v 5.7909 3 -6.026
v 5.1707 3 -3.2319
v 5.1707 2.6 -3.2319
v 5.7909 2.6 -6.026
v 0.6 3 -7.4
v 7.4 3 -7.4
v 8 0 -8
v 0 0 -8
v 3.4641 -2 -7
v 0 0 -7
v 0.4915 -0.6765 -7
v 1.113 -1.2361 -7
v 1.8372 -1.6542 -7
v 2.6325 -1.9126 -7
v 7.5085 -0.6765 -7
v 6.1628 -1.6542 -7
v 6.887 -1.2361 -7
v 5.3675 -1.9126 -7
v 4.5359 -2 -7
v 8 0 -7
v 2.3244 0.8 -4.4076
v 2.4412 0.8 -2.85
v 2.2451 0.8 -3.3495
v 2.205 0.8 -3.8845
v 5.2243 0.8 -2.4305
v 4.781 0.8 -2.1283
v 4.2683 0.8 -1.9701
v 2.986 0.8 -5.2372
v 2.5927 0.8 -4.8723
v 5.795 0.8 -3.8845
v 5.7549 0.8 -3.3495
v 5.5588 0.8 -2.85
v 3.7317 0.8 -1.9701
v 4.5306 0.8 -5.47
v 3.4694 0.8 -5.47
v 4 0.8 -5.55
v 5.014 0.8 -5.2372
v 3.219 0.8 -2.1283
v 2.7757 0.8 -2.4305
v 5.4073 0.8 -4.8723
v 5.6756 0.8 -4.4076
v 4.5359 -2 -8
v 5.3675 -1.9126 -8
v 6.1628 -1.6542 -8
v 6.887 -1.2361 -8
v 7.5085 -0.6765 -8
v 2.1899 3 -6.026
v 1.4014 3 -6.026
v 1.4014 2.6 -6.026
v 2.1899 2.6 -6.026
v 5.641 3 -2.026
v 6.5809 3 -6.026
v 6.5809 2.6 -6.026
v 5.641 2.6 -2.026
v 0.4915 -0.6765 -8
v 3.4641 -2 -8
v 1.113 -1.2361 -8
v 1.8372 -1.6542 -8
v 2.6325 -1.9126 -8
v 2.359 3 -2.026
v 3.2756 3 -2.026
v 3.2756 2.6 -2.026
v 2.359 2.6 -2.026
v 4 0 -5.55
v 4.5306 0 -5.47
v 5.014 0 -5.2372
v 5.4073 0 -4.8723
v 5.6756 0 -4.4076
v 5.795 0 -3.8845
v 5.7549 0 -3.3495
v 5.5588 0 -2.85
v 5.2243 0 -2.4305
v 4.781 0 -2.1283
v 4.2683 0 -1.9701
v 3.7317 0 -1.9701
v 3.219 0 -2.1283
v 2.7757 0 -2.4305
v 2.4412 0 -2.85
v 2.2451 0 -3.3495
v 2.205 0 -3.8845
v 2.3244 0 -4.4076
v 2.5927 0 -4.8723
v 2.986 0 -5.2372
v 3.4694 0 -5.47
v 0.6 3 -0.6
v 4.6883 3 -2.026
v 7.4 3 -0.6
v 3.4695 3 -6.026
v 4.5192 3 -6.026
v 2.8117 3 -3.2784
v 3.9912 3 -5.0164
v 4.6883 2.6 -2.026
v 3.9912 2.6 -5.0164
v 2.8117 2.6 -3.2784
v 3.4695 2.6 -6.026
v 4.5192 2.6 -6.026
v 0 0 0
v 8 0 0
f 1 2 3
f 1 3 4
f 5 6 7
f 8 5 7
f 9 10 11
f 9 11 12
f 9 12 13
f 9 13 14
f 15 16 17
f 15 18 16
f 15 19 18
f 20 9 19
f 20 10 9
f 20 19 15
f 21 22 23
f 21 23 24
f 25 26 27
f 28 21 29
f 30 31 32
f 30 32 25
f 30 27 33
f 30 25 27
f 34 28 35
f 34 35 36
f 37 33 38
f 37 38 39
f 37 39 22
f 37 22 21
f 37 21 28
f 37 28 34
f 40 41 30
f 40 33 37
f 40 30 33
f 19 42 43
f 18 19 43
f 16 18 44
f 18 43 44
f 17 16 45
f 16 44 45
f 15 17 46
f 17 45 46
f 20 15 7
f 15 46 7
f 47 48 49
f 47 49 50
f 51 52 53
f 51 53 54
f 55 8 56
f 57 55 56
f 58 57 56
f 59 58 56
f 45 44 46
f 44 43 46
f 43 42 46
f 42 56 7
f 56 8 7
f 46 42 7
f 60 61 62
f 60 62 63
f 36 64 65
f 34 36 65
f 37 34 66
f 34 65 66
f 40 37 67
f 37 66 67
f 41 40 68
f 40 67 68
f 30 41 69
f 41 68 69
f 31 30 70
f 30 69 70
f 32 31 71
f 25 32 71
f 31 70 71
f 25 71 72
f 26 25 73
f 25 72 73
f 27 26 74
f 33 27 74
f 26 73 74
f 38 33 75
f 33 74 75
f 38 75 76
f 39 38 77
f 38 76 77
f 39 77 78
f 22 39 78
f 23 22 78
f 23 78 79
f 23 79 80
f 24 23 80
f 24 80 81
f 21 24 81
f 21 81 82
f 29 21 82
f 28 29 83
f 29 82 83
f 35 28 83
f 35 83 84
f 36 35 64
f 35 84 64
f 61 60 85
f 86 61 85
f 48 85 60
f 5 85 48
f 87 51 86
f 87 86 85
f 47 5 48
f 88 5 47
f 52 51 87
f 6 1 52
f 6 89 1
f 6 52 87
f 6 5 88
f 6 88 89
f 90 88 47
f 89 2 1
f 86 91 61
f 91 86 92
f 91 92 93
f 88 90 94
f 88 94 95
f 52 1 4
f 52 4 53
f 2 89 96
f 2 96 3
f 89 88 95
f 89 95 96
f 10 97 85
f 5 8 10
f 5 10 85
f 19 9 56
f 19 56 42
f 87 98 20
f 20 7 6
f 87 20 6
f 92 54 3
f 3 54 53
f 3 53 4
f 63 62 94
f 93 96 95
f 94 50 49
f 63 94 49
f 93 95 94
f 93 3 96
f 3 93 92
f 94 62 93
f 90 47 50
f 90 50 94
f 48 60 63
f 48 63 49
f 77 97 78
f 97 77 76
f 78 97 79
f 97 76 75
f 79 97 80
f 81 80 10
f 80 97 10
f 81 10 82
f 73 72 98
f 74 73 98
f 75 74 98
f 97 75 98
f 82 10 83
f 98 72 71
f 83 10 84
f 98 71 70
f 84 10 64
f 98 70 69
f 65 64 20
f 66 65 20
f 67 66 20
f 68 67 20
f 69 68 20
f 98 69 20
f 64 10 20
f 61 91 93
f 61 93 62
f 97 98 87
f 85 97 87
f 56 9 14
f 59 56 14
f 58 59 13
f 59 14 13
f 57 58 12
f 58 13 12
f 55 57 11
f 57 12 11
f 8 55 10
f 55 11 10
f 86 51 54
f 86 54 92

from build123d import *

# Parameters (mm, degrees)
SKETCH1_W               = 8
SKETCH1_H               = 8
BOSS_EXTRUDE1_DEPTH     = 3
CUT_EXTRUDE1_DEPTH      = 12.704699911
CUT_EXTRUDE1_DEPTH_BACK = 12.704699911
CUT_EXTRUDE2_DEPTH      = 11
SKETCH4_R               = 1.8
CUT_EXTRUDE3_DEPTH      = 0.8
SKETCH5_W               = 8
SKETCH5_H               = 1
BOSS_EXTRUDE2_DEPTH     = 2
FILLET1_R               = 4
CUT_EXTRUDE4_DEPTH      = 0.4


with BuildPart() as part:
    # Sketch1 → Boss-Extrude1 (new body)
    with BuildSketch(Plane(origin=(0, 0, 0), x_dir=(1, 0, 0), z_dir=(0, 1, 0))):
        with Locations((4, 4)):
            Rectangle(SKETCH1_W, SKETCH1_H)
    extrude(amount=BOSS_EXTRUDE1_DEPTH)

    # Sketch2 → Cut-Extrude1 (cut, two sides: drawn at the far end of the back side and taken through both)
    with BuildSketch(Plane.XY.offset(-CUT_EXTRUDE1_DEPTH_BACK)):
        Polygon((0, 0), (0.6, 3), (0, 3), align=None)
        Polygon((8, 0), (7.4, 3), (8, 3), align=None)
    extrude(amount=CUT_EXTRUDE1_DEPTH + CUT_EXTRUDE1_DEPTH_BACK, mode=Mode.SUBTRACT)

    # Sketch3 → Cut-Extrude2 (cut)
    with BuildSketch(Plane(origin=(0, 0, 0), x_dir=(0, 0, -1), z_dir=(1, 0, 0))):
        Polygon((0, 0), (0.6, 3), (0, 3), align=None)
        Polygon((8, 3), (7.4, 3), (8, 0), align=None)
    extrude(amount=CUT_EXTRUDE2_DEPTH, mode=Mode.SUBTRACT)

    # Sketch4 → Cut-Extrude3 (cut)
    with BuildSketch(Plane.XZ):
        with Locations(Location((4, -3.75, 0), (0, 0, 270))):
            Circle(SKETCH4_R)
    extrude(amount=-CUT_EXTRUDE3_DEPTH, mode=Mode.SUBTRACT)

    # Sketch5 → Boss-Extrude2 (add)
    with BuildSketch(Plane.XZ):
        with Locations((4, -7.5)):
            Rectangle(SKETCH5_W, SKETCH5_H)
    extrude(amount=BOSS_EXTRUDE2_DEPTH)

    # Fillet1
    # the kernel refuses this fillet: 4 mm, written as the material it takes off along each edge
    with BuildSketch(Plane(origin=(8, -2, -16.660254038), x_dir=(0, 1, 0), z_dir=(0, 0, 1)), Plane(origin=(0, -2, 1.660254038), x_dir=(0, 1, 0), z_dir=(0, 0, -1))) as fillet1_piece_1:
        with BuildLine():
            CenterArc((4, 3.464101615), FILLET1_R, 180, 60)
            Line((0, 3.464101615), (-0.08, 3.464101615))
            Line((-0.08, 3.464101615), (-0.08, 0))
            Line((-0.08, 0), (0, -0.08))
            ThreePointArc((0, -0.08), (1, -0.08), (1.96, -0.069282032))
            Line((1.96, -0.069282032), (2, 0))
        make_face()
    extrude(amount=18.320508076, mode=Mode.SUBTRACT)

    # Sketch6 → Cut-Extrude4 (cut)
    with BuildSketch(Plane(origin=(0, 3, 0), x_dir=(1, 0, 0), z_dir=(0, 1, 0))):
        Polygon((2.358967796, 2.025988971), (1.401435745, 6.025988971), (2.189897284, 6.025988971), (2.811692155, 3.278392817), (3.469544719, 6.025988971), (4.519224207, 6.025988971), (5.170666514, 3.231918458), (5.790858822, 6.025988971), (6.580922925, 6.025988971), (5.641019078, 2.025988971), (4.688294719, 2.025988971), (3.991179335, 5.016373586), (3.275634463, 2.025988971), align=None)
    extrude(amount=-CUT_EXTRUDE4_DEPTH, mode=Mode.SUBTRACT)


solid = part.part
